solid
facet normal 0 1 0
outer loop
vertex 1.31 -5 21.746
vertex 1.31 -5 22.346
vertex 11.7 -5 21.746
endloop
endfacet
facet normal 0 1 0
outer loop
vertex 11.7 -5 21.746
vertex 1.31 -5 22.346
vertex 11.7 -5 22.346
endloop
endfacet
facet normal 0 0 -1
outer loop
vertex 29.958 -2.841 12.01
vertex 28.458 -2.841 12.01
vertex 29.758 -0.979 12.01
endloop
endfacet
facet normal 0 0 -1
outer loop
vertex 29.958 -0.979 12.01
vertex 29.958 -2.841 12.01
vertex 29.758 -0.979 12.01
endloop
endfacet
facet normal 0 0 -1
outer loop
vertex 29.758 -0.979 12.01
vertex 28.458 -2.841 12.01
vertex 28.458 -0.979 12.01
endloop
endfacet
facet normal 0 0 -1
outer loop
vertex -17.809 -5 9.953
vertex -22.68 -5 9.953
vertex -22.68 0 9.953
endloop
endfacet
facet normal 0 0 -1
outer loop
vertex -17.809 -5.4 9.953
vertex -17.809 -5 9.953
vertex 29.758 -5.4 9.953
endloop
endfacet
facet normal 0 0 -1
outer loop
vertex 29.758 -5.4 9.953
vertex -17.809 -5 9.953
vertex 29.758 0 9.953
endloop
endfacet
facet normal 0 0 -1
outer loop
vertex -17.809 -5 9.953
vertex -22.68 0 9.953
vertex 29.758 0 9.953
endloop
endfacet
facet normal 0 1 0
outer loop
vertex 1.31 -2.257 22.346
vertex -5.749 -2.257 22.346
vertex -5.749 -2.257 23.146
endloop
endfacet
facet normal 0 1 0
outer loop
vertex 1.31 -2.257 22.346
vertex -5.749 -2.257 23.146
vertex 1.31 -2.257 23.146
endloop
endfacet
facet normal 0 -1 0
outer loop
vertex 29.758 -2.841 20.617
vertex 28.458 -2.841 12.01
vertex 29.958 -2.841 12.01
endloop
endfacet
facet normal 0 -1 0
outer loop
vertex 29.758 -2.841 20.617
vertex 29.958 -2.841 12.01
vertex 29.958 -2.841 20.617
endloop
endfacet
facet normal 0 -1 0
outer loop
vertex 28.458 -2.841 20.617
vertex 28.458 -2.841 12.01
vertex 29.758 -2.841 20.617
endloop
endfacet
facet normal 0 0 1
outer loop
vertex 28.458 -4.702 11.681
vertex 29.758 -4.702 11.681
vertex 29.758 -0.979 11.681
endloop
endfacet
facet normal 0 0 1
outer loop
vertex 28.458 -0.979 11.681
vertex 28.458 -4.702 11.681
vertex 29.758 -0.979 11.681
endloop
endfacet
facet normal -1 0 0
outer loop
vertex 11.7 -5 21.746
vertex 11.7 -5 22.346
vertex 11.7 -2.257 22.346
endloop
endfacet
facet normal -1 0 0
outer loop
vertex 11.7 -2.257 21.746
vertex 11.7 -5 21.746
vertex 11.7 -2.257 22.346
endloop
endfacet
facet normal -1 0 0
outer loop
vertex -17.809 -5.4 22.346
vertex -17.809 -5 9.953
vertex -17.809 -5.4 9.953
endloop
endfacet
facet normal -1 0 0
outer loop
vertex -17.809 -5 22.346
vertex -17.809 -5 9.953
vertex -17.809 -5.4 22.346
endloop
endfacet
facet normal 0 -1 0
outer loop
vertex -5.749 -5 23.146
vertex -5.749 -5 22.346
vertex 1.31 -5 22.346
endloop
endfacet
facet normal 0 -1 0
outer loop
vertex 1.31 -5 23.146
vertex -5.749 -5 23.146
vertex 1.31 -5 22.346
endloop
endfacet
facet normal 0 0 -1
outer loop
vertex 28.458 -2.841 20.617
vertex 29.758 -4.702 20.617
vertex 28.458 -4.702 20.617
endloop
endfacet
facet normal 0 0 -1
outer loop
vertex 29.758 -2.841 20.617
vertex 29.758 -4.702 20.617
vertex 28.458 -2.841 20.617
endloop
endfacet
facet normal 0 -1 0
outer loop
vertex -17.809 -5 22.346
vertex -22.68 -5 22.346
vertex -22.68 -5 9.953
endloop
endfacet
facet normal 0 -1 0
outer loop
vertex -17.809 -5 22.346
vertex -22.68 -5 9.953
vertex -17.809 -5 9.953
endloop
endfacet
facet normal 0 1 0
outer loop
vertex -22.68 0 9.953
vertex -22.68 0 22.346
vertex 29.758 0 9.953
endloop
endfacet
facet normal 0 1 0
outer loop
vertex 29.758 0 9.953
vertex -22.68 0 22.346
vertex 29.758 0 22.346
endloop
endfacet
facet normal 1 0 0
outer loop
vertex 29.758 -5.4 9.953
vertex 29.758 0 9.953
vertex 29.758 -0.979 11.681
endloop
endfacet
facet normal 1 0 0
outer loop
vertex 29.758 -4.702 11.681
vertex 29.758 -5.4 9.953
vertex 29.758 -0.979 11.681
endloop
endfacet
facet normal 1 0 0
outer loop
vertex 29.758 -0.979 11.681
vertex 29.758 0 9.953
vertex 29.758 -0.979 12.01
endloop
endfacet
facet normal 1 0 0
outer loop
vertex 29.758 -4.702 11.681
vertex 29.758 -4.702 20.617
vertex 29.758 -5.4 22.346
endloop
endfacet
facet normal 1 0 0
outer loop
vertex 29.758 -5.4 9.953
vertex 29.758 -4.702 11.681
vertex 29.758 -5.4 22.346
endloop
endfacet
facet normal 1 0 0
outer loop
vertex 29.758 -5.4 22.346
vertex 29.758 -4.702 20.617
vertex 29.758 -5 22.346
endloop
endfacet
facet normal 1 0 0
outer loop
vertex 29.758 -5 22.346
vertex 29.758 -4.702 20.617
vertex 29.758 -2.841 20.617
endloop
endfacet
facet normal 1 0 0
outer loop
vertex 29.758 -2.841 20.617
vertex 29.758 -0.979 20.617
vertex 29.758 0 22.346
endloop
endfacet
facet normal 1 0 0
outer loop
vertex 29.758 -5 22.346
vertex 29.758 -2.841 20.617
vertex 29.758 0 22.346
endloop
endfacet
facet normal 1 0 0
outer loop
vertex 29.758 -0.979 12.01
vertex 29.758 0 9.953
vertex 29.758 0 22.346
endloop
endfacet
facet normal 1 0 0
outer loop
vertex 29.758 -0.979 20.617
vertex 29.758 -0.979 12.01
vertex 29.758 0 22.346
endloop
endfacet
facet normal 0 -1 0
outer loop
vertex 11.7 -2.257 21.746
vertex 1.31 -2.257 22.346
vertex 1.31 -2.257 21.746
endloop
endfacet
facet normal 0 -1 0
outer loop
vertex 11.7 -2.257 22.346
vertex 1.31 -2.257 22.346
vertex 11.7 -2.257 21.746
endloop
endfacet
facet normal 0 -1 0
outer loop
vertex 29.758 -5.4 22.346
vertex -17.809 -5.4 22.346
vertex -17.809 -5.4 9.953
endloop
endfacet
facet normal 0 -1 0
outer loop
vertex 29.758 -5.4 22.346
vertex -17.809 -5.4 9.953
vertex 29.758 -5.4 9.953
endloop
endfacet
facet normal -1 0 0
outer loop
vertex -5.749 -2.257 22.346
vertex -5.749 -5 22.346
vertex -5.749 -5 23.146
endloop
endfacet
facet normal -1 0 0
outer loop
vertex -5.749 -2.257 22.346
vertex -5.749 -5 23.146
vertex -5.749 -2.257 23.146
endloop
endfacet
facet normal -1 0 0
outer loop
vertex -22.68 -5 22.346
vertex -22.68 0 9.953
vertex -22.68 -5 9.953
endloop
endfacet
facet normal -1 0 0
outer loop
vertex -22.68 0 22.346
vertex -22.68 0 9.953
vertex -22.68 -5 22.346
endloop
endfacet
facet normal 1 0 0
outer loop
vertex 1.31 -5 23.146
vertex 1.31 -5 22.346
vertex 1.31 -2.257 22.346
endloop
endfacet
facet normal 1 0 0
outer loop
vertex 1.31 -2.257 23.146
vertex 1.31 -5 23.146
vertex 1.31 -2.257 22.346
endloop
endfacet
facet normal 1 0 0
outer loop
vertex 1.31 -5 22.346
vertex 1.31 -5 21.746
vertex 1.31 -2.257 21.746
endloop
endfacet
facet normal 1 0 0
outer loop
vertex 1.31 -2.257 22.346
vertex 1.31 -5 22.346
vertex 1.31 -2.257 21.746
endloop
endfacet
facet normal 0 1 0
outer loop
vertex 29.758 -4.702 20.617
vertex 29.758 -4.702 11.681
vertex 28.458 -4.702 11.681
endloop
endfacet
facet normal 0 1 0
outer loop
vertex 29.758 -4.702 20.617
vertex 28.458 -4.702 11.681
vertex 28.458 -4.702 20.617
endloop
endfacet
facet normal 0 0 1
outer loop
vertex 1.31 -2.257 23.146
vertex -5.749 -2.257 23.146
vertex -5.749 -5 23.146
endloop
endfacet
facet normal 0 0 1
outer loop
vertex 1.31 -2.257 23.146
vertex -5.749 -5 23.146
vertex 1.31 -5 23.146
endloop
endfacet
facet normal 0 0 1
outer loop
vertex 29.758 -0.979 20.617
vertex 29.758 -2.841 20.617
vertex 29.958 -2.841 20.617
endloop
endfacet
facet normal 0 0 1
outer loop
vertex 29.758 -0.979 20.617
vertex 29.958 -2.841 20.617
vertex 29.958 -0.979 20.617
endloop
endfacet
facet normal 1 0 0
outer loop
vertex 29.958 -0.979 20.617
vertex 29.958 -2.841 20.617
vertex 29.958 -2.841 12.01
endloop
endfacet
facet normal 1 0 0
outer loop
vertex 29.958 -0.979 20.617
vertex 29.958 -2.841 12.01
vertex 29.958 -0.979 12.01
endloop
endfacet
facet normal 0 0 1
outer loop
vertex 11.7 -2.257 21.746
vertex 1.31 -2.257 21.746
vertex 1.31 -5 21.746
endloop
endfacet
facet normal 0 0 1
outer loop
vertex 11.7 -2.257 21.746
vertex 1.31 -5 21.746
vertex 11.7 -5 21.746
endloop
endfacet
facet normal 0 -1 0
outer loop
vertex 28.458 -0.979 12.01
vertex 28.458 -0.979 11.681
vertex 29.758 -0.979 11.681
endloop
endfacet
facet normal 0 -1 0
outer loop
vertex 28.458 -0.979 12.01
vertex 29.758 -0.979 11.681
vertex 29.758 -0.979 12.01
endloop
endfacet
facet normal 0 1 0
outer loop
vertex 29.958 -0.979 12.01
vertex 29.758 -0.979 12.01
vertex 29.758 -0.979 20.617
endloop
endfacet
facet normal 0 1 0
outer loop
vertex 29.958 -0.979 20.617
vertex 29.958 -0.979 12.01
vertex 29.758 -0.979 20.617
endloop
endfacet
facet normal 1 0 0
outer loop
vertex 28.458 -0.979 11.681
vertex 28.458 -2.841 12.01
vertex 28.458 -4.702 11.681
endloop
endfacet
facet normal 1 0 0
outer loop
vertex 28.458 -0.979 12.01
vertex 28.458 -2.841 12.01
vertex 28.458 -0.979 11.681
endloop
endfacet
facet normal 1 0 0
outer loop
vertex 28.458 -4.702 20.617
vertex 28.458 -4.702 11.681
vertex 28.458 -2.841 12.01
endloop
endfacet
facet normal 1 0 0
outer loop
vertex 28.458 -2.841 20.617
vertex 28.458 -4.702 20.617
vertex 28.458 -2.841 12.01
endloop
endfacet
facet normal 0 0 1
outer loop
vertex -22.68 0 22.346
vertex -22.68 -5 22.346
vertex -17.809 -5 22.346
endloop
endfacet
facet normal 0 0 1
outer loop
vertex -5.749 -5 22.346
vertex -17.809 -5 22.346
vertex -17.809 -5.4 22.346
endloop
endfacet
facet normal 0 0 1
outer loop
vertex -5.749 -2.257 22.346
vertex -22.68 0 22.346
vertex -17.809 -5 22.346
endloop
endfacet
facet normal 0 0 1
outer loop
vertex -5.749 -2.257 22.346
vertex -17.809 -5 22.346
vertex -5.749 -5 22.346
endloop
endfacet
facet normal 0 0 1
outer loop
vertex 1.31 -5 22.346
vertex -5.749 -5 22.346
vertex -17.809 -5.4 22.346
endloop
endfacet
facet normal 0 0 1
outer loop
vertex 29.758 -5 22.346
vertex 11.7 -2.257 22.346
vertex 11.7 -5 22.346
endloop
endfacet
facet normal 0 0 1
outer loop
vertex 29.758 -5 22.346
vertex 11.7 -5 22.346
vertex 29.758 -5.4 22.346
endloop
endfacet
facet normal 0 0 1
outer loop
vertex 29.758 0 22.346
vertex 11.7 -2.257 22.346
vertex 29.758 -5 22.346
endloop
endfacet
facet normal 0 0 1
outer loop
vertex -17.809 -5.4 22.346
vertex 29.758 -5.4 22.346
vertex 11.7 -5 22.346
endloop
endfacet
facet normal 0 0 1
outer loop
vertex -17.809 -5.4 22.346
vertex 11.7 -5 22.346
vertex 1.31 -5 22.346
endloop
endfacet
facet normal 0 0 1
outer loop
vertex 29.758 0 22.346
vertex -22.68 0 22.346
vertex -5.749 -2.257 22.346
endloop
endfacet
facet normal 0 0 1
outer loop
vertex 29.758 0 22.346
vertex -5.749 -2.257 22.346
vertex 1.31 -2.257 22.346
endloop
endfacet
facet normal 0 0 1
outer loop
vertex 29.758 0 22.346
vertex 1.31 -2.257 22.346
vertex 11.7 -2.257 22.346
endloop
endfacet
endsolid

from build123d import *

# Parameters (mm, degrees)
F0_W      = 52.4384081364
F0_H      = 12.3928444714
F1_DEPTH  = 5
F2_W      = 47.5675082519
F2_H      = 12.3928444714
F3_DEPTH  = 0.4
F4_W      = 17.4495708197
F4_H      = 2.7426069784
F5_DEPTH  = 0.6
F6_W      = 7.059096708
F6_H      = 2.7426069784
F7_DEPTH  = 1.4
F8_W      = 3.7224081942
F8_H      = 8.9364917949
F9_DEPTH  = 1.3
F10_W     = 1.8612040971
F10_H     = 8.6072823033
F11_DEPTH = 1.5


with BuildPart() as f1:
    # F0 (on Front) → F1 (new body)
    with BuildSketch(Plane.XZ):
        with Locations((3.5388600081, 16.1491944455)):
            Rectangle(F0_W, F0_H)
    extrude(amount=F1_DEPTH)

    # F2 (on face) → F3 (join)
    with BuildSketch(Plane.XZ.offset(5)):
        with Locations((5.9743099503, 16.1491944455)):
            Rectangle(F2_W, F2_H)
    extrude(amount=F3_DEPTH)

    # F4 (on face) → F5 (cut)
    with BuildSketch(Plane.XY.offset(22.3456166812)):
        with Locations((2.9753278941, -3.6286965108)):
            Rectangle(F4_W, F4_H)
    extrude(amount=-F5_DEPTH, mode=Mode.SUBTRACT)

    # F6 (on face) → F7 (join)
    with BuildSketch(Plane.XY.offset(21.7456166812)):
        with Locations((-2.2199091618, -3.6286965108)):
            Rectangle(F6_W, F6_H)
    extrude(amount=F7_DEPTH)

    # F8 (on face) → F9 (cut)
    with BuildSketch(Plane.YZ.offset(29.7580640763)):
        with Locations((-2.8406968922, 16.1491944455)):
            Rectangle(F8_W, F8_H)
    extrude(amount=-F9_DEPTH, mode=Mode.SUBTRACT)

    # F10 (on face) → F11 (join)
    with BuildSketch(Plane.YZ.offset(28.4580640763)):
        with Locations((-1.9100948437, 16.3137991913)):
            Rectangle(F10_W, F10_H)
    extrude(amount=F11_DEPTH)


solid = f1.part
